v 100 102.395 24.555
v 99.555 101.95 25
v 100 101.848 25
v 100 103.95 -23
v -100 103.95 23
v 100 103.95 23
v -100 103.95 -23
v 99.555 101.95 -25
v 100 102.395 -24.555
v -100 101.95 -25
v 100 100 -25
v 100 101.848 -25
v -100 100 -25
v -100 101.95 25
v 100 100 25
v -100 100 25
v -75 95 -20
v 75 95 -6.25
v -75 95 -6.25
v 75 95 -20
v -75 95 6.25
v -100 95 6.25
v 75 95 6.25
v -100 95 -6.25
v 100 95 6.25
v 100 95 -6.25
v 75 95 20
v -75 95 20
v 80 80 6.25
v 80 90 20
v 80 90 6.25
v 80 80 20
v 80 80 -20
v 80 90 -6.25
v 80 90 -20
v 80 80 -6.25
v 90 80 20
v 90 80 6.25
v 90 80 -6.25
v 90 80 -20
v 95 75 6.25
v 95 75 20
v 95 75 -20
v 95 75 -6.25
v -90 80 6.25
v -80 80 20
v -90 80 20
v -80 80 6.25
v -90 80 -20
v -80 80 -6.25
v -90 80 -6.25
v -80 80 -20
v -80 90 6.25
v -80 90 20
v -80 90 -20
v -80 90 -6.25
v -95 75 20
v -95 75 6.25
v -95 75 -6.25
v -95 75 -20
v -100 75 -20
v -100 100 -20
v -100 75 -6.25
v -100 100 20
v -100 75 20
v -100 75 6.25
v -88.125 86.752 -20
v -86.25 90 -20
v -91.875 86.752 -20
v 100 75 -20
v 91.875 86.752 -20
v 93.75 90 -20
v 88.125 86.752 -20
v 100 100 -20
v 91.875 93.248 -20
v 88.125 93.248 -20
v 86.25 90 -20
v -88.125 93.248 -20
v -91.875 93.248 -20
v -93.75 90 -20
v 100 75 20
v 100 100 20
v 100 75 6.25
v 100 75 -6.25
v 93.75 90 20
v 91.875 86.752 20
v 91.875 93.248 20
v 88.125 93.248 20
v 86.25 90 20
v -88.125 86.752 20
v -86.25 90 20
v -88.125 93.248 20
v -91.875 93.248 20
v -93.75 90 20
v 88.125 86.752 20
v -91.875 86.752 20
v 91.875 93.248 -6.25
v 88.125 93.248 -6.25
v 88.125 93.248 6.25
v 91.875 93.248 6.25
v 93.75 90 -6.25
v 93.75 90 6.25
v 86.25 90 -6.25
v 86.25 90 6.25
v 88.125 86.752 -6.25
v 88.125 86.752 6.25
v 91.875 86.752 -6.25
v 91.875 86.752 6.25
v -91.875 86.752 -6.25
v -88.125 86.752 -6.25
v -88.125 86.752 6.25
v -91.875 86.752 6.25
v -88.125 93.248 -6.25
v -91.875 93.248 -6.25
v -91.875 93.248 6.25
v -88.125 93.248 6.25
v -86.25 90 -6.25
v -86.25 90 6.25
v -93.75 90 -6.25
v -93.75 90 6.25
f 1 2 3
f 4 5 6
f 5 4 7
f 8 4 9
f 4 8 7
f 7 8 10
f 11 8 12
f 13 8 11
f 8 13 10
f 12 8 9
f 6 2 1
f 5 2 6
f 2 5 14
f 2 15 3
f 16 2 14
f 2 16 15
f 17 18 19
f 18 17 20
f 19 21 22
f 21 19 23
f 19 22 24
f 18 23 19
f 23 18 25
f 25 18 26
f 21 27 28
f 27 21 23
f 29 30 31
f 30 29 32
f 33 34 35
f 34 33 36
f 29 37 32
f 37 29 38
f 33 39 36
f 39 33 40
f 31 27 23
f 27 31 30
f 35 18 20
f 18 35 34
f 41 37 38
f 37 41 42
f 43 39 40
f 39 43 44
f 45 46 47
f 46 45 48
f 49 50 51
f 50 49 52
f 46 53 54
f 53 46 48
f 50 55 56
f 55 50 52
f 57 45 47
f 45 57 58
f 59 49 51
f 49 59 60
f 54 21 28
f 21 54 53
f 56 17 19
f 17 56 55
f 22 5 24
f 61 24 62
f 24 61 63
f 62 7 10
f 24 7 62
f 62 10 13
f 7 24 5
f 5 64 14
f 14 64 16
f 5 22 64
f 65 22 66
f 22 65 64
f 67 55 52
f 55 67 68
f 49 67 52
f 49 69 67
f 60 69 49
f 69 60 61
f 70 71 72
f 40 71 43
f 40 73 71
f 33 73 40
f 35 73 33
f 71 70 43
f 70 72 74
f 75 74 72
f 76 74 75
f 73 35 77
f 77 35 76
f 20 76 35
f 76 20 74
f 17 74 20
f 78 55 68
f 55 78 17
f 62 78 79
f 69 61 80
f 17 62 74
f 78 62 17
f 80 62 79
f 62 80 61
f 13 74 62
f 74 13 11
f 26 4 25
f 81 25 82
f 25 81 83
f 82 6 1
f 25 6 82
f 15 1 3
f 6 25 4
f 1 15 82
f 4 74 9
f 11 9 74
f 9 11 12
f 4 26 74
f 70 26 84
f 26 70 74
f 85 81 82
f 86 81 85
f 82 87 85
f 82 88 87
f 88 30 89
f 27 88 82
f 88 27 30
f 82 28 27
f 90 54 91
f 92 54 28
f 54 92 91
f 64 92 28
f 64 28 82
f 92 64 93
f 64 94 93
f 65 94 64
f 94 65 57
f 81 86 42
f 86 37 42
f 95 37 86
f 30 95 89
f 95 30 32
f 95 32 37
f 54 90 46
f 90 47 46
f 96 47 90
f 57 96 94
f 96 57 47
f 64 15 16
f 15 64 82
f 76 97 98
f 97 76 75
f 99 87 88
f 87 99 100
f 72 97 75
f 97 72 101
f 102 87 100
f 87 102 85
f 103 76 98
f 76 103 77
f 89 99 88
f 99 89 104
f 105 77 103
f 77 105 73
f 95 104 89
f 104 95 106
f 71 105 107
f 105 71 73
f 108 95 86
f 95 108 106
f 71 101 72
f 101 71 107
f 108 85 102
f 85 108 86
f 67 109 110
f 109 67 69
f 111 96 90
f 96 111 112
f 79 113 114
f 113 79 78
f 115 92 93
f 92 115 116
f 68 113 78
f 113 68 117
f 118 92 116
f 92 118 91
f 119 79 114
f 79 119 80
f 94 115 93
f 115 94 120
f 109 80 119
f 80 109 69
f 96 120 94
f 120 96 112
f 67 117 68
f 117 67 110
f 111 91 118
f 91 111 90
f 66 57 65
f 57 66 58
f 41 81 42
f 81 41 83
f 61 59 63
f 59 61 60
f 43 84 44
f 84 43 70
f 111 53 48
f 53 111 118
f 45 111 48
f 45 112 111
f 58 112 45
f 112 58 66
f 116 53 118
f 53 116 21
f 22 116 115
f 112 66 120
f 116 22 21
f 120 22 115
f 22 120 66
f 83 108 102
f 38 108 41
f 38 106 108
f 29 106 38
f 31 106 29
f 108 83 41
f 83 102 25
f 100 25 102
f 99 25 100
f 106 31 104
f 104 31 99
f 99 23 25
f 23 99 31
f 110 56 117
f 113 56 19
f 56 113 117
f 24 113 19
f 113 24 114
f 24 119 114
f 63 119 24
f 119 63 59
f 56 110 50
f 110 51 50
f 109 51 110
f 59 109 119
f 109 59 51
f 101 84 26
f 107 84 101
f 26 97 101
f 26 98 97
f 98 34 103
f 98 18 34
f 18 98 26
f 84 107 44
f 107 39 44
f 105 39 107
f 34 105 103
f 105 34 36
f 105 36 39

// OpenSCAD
// file: frame-left.scad
/*
 * SPDX-FileCopyrightText: © 2023 Brian S. Stephan <bss@incorporeal.org>
 * SPDX-License-Identifier: GPL-3.0-or-later
 */

include <parameters.scad>
include <components.scad>

module base_left_frame() {
	difference() {
		frame();
		// chop the right edge off
		side_chopper();
	}
}

module left_frame() {
	difference() {
		base_left_frame();
		// connection holes to other frames
		frame_connection_holes();

		// cable routing hole
		frame_cable_routing_hole();

		// aux button holes
		//translate([-35, 101.5, 0]) rotate([270, 0, 0]) aux_control_three_button_cluster();
		//translate([-35, (frame_y/2)-neutrik_panel_thickness-4, 0]) frame_cutout();
		//translate([-72, (frame_y/2)-neutrik_panel_thickness-4, 0]) frame_cutout();
		//translate([2, (frame_y/2)-neutrik_panel_thickness-4, 0]) frame_cutout();

		// neutrix button hole
		//translate([frame_center_to_neutrik, (frame_y/2)-neutrik_panel_thickness, 0]) rotate([90, 0, 0]) neutrik_d_mount();
		//translate([frame_center_to_neutrik, (frame_y/2)-neutrik_panel_thickness-4, 0]) frame_cutout();
	}
}

left_frame();
// file: parameters.scad
/*
 * SPDX-FileCopyrightText: © 2023 Brian S. Stephan <bss@incorporeal.org>
 * SPDX-License-Identifier: GPL-3.0-or-later
 */

// adjustments
hole_tolerance = 0.15;

// M2
m2_screw_selftap_radius = 0.95;

// M3
m3_screw_selftap_radius = 1.3;

// M4
m4_bolt_radius = 2 + hole_tolerance;
m4_bolt_countersink_radius = 6.1 + hole_tolerance;
m4_bolt_hex_exterior_radius = 3.6 + hole_tolerance;

// 24mm button
small_button_radius = 12 + hole_tolerance;

// 30mm button
big_button_radius = 15 + hole_tolerance;

// JLF mount dimensions
lever_mount_x = 53;
lever_mount_y = 95;
lever_mount_z = 2;

// standard lever hole
lever_plate_hole = 12;


// case dimensions
// base frame box. reminder: top of inside (including mounts) is chopped by panel_z for plates
frame_x = 208;
frame_y = 208;
frame_z = 50;

// middle piece dimensions
mid_frame_x = 118;

/*
frame_x = 233;
frame_y = 208;
frame_z = 57;
*/



// degree to which the extended frame pieces stick out from the end of the frame
frame_extension_x = 25;
frame_extension_y = 25;

// this sinks the bottom and top of the frame inward a bit, and is used to math out two shapes
// when creating the frame box / overhang panel
frame_bevel_height = 2;
overhang_panel_bevel_height = 1;

frame_center_to_neutrik = 70;

// depth of the "lip" of the frame that the top plate sets into/supports the overhang
frame_wall = 4;

// width of the column in the frame corners to support the hex bolt
frame_mount_column_width = 20;

// per neutrik (mm)
neutrik_panel_thickness = 3;

// top plate, which can either be the whole plate ("inset") or the mounting frame for a plate that overhangs
panel_x = frame_x - (frame_wall * 2);
panel_y = frame_y - (frame_wall * 2);
panel_z = 5;
mid_panel_x = mid_frame_x - (frame_wall * 2);


// how much the top plate x/y is expanded to overhang the frame
// note that this is relative to the top plate (so the wall is added back)
panel_overhang_amount = 8.5;
overhang_panel_x = panel_x + (frame_wall * 2) + (panel_overhang_amount * 2);
overhang_panel_y = panel_y + (frame_wall * 2) + (panel_overhang_amount * 2);
// mid overhang
mid_overhang_panel_x = mid_panel_x + (frame_wall * 2) + (panel_overhang_amount * 2);


panel_to_frame_point_x = (panel_x/2)-10;
panel_to_frame_point_y = (panel_y/2)-10;
mid_panel_to_frame_point_x = (mid_panel_x/2)-10;


// frame interior that supports the top plates
panel_support_width = 5;

// neutrik D screw holes
neutrik_d_screw_radius = 1.6 + hole_tolerance;
neutrik_d_radius = 12 + hole_tolerance;

// additional button radius for decorative panels, etc.
decorative_radius_scale = 1.75;
jumbo_decorative_radius_scale = 2;
// main file
/*
 * SPDX-FileCopyrightText: © 2024 Brian S. Stephan <bss@incorporeal.org>
 * SPDX-License-Identifier: GPL-3.0-or-later
 */

include <parameters.scad>
include <components.scad>
use <frame-left.scad>

module top_right_frame_piece() {
	piece_width = panel_support_width+frame_wall+frame_mount_column_width;
	intersection() {
		left_frame();
		difference() {
			// include the whole top wall (including mount columns)
			translate([0, (frame_y/2)-(piece_width/2), 0]) cube([frame_x, piece_width, frame_z], center=true);
			// ...minus the frame wall and lip on the left
			translate([-frame_x/2+frame_wall/2, 0, 0])
				cube([frame_wall, frame_y, frame_z], center=true);
			// ...minus a slot for the combining piece to go into
			cube([frame_x, frame_y-(panel_support_width+frame_wall)*2, frame_z/4], center=true);
		}
	}
}

top_right_frame_piece();
